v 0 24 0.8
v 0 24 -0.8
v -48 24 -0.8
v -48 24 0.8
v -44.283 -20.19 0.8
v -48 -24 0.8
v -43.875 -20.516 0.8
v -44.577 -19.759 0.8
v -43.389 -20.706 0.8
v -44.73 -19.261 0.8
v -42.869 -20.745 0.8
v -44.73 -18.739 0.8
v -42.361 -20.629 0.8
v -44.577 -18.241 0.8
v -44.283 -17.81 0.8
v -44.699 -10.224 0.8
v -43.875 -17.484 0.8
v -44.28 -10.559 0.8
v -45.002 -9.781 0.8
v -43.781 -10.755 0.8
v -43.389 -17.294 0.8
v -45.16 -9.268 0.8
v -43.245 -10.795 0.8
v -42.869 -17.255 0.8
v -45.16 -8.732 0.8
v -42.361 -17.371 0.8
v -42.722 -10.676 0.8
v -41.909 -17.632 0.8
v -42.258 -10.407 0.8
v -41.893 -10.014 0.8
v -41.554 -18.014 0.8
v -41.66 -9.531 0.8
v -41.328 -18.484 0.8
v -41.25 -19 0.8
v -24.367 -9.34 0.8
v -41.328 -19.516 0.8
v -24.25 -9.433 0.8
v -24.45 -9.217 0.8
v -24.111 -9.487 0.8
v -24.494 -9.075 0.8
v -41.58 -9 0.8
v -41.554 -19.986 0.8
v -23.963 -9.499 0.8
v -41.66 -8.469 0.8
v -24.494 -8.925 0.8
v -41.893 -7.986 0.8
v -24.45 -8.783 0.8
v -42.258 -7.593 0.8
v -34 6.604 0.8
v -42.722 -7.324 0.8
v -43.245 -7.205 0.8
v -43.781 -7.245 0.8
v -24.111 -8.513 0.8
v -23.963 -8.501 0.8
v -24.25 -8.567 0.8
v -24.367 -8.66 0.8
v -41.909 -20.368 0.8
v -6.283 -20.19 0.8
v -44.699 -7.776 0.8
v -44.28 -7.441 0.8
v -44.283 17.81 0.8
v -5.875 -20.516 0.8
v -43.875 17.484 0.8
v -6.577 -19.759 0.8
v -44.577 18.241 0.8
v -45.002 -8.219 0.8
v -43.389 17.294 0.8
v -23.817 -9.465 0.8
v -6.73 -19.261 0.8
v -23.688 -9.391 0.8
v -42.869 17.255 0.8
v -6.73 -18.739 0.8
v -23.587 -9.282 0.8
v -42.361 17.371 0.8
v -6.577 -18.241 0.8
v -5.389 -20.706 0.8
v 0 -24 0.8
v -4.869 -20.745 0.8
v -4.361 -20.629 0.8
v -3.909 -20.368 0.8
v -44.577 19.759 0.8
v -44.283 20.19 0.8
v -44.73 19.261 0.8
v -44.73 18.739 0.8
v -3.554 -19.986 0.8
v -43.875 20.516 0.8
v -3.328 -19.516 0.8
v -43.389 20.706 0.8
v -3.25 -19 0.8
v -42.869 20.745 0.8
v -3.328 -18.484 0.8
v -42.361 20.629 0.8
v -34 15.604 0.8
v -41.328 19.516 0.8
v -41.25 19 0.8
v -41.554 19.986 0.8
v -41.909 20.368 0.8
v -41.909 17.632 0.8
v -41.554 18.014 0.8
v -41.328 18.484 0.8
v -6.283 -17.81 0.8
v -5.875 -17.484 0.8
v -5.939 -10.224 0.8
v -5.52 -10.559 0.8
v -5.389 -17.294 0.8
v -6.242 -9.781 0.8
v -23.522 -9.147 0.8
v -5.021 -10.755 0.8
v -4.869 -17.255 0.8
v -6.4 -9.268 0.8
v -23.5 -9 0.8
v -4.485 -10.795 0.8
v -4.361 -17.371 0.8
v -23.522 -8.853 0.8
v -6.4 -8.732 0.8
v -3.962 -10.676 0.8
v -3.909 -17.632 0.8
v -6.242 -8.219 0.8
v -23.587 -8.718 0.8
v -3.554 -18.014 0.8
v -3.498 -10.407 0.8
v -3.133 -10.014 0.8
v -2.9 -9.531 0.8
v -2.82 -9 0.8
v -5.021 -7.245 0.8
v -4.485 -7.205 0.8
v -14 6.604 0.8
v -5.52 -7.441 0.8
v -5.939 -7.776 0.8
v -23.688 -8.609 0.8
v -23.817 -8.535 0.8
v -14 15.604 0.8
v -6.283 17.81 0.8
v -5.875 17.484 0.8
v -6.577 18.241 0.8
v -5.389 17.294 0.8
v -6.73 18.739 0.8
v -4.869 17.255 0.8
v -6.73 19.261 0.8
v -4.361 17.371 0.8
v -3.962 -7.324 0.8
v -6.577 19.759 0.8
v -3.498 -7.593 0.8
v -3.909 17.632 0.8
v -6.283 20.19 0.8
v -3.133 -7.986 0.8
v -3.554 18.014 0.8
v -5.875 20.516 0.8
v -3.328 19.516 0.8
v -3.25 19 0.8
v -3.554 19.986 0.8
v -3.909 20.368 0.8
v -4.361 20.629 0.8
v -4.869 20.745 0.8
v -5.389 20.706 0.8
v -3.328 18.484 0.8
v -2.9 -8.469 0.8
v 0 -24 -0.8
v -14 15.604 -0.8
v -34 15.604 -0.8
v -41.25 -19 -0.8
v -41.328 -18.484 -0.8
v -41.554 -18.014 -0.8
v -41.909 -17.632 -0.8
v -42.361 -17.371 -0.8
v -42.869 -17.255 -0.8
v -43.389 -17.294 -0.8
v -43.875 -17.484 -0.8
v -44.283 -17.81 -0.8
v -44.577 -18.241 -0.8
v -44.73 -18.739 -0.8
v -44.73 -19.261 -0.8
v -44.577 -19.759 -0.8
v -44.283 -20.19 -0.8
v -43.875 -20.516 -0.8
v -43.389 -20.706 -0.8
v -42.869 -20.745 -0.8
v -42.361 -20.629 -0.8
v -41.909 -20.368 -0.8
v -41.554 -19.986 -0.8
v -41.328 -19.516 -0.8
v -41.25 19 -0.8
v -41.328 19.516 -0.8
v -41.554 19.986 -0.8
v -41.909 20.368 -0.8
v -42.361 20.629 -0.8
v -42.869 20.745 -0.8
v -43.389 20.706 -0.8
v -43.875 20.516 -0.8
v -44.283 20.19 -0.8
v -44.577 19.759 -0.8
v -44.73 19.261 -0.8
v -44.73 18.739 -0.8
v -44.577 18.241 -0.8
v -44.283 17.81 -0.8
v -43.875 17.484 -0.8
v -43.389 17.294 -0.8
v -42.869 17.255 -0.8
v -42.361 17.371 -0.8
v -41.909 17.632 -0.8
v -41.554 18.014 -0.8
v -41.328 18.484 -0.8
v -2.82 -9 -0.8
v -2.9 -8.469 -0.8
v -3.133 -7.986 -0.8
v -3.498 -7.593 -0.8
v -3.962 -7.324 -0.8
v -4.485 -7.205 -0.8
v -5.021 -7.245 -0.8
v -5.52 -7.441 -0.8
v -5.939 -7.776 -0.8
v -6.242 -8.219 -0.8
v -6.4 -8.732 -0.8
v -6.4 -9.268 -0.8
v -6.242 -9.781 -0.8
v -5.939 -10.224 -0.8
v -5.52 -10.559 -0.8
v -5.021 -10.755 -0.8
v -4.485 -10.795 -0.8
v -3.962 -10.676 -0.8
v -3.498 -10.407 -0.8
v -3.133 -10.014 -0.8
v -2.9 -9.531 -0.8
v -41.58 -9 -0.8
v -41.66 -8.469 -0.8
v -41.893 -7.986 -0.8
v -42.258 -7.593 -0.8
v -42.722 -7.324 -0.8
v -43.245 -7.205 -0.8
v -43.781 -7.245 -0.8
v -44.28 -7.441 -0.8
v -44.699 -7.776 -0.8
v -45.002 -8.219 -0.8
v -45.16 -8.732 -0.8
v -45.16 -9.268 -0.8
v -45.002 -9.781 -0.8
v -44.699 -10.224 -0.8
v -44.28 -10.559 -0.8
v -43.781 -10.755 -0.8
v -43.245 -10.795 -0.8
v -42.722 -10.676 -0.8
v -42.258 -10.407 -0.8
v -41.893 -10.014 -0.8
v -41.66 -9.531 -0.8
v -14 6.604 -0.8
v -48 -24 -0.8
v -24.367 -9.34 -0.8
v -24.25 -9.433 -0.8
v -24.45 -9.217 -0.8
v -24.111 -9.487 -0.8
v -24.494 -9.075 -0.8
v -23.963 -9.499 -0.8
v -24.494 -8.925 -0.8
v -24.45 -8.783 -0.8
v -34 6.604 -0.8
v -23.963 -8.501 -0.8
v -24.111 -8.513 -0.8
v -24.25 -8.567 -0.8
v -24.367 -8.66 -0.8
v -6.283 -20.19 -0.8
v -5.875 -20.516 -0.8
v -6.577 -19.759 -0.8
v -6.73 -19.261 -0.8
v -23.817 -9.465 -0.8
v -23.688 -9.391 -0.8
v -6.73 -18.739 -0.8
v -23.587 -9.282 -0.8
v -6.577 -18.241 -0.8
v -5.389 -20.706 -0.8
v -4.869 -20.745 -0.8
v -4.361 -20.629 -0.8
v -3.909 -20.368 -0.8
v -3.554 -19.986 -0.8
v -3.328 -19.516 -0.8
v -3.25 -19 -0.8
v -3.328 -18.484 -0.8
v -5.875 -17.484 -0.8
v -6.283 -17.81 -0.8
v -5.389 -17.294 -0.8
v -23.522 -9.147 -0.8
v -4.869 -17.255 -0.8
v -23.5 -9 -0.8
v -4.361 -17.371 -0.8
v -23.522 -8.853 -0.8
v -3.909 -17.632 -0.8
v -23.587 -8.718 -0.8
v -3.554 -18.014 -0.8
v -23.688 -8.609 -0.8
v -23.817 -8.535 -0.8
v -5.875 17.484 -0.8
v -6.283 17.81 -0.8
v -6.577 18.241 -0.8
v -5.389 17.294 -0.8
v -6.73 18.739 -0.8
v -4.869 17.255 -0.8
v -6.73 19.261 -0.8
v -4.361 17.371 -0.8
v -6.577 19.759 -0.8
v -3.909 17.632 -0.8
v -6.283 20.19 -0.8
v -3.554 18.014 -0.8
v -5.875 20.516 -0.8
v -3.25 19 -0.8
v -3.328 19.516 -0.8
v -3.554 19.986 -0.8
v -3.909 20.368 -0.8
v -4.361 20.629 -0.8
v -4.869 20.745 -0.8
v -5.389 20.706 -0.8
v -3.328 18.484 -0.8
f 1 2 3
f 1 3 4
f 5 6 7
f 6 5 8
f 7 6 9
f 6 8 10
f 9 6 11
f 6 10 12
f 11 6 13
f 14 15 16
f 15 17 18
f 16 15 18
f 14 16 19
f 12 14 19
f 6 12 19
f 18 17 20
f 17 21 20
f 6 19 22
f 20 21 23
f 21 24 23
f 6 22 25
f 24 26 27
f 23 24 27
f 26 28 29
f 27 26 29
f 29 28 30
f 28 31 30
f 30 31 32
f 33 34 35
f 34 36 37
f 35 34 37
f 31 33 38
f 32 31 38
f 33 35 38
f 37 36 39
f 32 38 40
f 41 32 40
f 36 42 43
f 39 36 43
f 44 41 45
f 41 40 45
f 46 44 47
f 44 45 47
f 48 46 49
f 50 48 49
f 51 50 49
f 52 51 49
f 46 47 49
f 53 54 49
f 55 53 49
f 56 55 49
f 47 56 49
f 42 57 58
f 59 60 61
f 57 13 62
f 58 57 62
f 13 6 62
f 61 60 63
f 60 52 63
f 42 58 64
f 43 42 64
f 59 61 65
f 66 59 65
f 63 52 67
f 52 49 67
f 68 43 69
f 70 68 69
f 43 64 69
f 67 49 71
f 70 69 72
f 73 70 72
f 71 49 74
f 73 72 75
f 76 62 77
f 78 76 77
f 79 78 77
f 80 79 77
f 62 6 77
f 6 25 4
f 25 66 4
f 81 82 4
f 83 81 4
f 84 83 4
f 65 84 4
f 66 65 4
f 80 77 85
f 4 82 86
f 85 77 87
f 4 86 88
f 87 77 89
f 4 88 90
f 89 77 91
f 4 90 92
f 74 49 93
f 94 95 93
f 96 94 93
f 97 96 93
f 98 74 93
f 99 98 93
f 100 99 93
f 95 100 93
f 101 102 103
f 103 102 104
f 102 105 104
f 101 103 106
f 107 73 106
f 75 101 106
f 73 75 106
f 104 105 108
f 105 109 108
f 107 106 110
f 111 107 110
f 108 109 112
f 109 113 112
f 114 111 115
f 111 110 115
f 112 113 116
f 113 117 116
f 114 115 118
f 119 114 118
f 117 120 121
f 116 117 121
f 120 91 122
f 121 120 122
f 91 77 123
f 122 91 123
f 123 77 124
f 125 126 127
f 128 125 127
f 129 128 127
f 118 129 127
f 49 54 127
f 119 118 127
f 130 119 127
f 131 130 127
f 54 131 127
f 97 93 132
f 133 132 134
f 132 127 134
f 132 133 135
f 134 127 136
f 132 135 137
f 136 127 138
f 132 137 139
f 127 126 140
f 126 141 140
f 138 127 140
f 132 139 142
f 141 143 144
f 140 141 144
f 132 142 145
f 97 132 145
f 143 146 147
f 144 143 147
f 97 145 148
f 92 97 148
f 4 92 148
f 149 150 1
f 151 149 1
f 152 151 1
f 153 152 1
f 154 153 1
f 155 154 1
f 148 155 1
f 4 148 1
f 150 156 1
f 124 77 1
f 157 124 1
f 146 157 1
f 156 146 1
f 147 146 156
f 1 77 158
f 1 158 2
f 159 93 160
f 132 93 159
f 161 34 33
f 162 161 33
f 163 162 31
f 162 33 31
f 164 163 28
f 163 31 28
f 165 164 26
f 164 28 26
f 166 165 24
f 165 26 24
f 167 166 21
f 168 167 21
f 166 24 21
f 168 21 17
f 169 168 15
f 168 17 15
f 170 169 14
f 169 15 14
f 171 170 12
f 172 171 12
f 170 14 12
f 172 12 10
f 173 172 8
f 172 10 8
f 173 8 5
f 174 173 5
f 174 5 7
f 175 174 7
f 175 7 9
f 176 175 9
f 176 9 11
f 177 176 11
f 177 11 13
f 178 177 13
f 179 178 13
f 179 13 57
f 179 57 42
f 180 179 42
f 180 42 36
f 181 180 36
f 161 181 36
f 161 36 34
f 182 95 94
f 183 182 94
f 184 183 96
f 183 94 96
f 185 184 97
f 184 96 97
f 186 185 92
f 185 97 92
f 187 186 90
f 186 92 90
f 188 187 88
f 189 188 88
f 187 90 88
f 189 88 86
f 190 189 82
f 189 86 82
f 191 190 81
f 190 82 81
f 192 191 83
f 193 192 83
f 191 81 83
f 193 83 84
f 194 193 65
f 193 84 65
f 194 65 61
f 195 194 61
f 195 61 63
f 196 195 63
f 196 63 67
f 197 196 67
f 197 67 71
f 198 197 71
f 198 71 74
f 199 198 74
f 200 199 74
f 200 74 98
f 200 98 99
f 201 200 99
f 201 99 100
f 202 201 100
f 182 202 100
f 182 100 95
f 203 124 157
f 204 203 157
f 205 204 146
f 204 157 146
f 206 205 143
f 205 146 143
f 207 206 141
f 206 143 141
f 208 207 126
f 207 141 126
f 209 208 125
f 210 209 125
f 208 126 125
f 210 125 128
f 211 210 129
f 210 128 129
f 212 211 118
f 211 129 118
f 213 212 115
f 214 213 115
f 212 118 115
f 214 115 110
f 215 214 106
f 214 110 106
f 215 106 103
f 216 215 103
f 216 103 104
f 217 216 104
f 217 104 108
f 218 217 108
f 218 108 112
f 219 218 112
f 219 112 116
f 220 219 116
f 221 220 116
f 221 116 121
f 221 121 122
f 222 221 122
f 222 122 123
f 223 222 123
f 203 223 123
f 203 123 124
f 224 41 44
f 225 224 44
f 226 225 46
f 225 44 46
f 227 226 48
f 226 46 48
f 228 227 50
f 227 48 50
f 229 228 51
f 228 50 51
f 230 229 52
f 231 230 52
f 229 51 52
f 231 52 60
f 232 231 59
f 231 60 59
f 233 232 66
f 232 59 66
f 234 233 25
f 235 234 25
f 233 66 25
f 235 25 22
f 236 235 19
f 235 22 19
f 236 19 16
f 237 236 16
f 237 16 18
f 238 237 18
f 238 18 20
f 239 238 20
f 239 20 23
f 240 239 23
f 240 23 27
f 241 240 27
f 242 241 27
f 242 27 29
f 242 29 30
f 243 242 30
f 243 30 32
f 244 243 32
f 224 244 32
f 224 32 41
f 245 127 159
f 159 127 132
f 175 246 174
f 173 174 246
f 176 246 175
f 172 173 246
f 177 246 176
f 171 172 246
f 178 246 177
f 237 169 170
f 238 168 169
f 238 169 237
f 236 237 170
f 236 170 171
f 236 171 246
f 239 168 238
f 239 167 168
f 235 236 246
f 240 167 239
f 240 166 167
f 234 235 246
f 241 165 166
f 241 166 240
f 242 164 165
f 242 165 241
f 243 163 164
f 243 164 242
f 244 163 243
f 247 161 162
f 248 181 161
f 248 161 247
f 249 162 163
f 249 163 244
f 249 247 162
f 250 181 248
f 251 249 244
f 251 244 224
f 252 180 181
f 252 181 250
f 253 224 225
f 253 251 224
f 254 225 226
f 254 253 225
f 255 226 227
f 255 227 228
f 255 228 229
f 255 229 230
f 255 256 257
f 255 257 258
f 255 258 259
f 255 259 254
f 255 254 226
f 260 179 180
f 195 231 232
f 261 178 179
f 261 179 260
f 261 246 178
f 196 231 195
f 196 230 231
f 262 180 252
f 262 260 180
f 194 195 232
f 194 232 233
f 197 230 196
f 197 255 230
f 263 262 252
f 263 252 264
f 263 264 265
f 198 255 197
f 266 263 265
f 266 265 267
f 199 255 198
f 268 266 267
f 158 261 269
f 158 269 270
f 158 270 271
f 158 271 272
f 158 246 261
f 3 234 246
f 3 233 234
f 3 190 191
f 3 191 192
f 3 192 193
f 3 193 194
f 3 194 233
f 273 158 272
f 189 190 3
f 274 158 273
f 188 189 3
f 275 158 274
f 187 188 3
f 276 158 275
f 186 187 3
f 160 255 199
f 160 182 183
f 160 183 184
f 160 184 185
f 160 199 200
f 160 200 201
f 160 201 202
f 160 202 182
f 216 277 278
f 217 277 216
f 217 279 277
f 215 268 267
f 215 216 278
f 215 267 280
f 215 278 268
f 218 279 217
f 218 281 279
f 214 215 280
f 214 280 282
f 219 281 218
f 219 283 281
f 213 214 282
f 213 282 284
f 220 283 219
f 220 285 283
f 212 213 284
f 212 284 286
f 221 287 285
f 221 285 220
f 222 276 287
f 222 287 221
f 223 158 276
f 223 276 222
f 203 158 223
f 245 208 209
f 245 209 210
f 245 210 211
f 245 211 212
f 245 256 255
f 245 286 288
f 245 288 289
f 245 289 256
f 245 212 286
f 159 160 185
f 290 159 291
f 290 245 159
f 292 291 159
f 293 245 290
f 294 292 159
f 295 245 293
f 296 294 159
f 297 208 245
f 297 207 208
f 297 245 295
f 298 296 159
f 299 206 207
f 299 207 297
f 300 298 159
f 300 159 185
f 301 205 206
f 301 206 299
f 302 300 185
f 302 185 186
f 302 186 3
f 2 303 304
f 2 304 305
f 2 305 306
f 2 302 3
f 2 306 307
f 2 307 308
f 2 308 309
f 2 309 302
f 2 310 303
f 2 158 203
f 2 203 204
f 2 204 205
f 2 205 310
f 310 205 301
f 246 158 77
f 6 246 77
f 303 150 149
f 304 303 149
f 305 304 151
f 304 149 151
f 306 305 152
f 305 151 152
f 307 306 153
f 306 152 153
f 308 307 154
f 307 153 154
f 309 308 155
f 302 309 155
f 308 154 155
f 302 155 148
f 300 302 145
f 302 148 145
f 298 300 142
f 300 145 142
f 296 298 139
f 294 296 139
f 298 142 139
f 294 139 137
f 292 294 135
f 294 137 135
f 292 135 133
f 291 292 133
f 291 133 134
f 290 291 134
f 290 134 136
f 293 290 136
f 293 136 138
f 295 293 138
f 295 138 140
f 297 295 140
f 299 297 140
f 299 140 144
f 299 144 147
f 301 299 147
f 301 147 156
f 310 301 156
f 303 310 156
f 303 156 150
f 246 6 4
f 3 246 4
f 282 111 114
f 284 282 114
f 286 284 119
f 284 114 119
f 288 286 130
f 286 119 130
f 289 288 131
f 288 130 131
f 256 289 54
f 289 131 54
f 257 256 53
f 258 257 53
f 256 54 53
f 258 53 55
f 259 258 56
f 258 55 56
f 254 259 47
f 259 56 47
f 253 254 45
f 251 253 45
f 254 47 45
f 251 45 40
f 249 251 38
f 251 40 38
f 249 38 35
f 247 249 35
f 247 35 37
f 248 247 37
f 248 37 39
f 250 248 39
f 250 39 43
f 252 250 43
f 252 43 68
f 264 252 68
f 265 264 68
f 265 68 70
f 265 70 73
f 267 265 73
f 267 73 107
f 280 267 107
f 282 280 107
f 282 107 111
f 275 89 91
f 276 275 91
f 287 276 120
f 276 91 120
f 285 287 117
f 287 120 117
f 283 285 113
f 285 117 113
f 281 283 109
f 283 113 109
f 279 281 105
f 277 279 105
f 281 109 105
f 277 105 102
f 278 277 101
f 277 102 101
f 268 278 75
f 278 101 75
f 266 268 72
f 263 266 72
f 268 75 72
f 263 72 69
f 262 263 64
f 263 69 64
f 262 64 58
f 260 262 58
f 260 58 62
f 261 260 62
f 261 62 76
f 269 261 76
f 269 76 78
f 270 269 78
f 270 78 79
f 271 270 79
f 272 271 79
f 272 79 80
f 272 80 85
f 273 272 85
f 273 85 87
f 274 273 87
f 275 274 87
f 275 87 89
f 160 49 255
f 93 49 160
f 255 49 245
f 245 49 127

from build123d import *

# Parameters (mm, degrees)
F0_W     = 48
F0_H     = 1.6
F1_DEPTH = 48
F2_R     = 1.75
F2_R_2   = 1.8
F2_R_3   = 0.5
F3_DEPTH = 1.601
F4_W     = 20
F4_H     = 9
F5_DEPTH = 1.601
F6_W     = 48
F6_H     = 48
F6_R     = 1.75
F6_W_2   = 20
F6_H_2   = 9
F7_DEPTH = 5


with BuildPart() as f1:
    # F0 (on Right) → F1 (new body)
    with BuildSketch(Plane.YZ):
        Rectangle(F0_W, F0_H)
    extrude(amount=-F1_DEPTH)

    # F2 (on face) → F3 (cut, through all)
    with BuildSketch(Plane.XY.offset(0.8)):
        with Locations((-43, -19)):
            Circle(F2_R)
        with Locations((-43, 19)):
            Circle(F2_R)
        with Locations((-43.38, -9)):
            Circle(F2_R_2)
        with Locations((-4.62, -9)):
            Circle(F2_R_2)
        with Locations((-5, 19)):
            Circle(F2_R)
        with Locations((-5, -19)):
            Circle(F2_R)
        with Locations((-24, -9)):
            Circle(F2_R_3)
    extrude(amount=-F3_DEPTH, mode=Mode.SUBTRACT)

    # F4 (on face) → F5 (cut, through all)
    with BuildSketch(Plane.XY.offset(0.8)):
        with Locations((-24, 11.104)):
            Rectangle(F4_W, F4_H)
    extrude(amount=-F5_DEPTH, mode=Mode.SUBTRACT)


with BuildPart() as f7:
    # F6 (on Top) → F7 (new body)
    with BuildSketch(Plane.XY):
        Rectangle(F6_W, F6_H)
        with Locations((-19, -19)):
            Circle(F6_R, mode=Mode.SUBTRACT)
        with Locations((19, -19)):
            Circle(F6_R, mode=Mode.SUBTRACT)
        with Locations((-19, 19)):
            Circle(F6_R, mode=Mode.SUBTRACT)
        with Locations((0, 14.5)):
            Rectangle(F6_W_2, F6_H_2, mode=Mode.SUBTRACT)
        with Locations((19, 19)):
            Circle(F6_R, mode=Mode.SUBTRACT)
    extrude(amount=F7_DEPTH)


solid = f1.part
